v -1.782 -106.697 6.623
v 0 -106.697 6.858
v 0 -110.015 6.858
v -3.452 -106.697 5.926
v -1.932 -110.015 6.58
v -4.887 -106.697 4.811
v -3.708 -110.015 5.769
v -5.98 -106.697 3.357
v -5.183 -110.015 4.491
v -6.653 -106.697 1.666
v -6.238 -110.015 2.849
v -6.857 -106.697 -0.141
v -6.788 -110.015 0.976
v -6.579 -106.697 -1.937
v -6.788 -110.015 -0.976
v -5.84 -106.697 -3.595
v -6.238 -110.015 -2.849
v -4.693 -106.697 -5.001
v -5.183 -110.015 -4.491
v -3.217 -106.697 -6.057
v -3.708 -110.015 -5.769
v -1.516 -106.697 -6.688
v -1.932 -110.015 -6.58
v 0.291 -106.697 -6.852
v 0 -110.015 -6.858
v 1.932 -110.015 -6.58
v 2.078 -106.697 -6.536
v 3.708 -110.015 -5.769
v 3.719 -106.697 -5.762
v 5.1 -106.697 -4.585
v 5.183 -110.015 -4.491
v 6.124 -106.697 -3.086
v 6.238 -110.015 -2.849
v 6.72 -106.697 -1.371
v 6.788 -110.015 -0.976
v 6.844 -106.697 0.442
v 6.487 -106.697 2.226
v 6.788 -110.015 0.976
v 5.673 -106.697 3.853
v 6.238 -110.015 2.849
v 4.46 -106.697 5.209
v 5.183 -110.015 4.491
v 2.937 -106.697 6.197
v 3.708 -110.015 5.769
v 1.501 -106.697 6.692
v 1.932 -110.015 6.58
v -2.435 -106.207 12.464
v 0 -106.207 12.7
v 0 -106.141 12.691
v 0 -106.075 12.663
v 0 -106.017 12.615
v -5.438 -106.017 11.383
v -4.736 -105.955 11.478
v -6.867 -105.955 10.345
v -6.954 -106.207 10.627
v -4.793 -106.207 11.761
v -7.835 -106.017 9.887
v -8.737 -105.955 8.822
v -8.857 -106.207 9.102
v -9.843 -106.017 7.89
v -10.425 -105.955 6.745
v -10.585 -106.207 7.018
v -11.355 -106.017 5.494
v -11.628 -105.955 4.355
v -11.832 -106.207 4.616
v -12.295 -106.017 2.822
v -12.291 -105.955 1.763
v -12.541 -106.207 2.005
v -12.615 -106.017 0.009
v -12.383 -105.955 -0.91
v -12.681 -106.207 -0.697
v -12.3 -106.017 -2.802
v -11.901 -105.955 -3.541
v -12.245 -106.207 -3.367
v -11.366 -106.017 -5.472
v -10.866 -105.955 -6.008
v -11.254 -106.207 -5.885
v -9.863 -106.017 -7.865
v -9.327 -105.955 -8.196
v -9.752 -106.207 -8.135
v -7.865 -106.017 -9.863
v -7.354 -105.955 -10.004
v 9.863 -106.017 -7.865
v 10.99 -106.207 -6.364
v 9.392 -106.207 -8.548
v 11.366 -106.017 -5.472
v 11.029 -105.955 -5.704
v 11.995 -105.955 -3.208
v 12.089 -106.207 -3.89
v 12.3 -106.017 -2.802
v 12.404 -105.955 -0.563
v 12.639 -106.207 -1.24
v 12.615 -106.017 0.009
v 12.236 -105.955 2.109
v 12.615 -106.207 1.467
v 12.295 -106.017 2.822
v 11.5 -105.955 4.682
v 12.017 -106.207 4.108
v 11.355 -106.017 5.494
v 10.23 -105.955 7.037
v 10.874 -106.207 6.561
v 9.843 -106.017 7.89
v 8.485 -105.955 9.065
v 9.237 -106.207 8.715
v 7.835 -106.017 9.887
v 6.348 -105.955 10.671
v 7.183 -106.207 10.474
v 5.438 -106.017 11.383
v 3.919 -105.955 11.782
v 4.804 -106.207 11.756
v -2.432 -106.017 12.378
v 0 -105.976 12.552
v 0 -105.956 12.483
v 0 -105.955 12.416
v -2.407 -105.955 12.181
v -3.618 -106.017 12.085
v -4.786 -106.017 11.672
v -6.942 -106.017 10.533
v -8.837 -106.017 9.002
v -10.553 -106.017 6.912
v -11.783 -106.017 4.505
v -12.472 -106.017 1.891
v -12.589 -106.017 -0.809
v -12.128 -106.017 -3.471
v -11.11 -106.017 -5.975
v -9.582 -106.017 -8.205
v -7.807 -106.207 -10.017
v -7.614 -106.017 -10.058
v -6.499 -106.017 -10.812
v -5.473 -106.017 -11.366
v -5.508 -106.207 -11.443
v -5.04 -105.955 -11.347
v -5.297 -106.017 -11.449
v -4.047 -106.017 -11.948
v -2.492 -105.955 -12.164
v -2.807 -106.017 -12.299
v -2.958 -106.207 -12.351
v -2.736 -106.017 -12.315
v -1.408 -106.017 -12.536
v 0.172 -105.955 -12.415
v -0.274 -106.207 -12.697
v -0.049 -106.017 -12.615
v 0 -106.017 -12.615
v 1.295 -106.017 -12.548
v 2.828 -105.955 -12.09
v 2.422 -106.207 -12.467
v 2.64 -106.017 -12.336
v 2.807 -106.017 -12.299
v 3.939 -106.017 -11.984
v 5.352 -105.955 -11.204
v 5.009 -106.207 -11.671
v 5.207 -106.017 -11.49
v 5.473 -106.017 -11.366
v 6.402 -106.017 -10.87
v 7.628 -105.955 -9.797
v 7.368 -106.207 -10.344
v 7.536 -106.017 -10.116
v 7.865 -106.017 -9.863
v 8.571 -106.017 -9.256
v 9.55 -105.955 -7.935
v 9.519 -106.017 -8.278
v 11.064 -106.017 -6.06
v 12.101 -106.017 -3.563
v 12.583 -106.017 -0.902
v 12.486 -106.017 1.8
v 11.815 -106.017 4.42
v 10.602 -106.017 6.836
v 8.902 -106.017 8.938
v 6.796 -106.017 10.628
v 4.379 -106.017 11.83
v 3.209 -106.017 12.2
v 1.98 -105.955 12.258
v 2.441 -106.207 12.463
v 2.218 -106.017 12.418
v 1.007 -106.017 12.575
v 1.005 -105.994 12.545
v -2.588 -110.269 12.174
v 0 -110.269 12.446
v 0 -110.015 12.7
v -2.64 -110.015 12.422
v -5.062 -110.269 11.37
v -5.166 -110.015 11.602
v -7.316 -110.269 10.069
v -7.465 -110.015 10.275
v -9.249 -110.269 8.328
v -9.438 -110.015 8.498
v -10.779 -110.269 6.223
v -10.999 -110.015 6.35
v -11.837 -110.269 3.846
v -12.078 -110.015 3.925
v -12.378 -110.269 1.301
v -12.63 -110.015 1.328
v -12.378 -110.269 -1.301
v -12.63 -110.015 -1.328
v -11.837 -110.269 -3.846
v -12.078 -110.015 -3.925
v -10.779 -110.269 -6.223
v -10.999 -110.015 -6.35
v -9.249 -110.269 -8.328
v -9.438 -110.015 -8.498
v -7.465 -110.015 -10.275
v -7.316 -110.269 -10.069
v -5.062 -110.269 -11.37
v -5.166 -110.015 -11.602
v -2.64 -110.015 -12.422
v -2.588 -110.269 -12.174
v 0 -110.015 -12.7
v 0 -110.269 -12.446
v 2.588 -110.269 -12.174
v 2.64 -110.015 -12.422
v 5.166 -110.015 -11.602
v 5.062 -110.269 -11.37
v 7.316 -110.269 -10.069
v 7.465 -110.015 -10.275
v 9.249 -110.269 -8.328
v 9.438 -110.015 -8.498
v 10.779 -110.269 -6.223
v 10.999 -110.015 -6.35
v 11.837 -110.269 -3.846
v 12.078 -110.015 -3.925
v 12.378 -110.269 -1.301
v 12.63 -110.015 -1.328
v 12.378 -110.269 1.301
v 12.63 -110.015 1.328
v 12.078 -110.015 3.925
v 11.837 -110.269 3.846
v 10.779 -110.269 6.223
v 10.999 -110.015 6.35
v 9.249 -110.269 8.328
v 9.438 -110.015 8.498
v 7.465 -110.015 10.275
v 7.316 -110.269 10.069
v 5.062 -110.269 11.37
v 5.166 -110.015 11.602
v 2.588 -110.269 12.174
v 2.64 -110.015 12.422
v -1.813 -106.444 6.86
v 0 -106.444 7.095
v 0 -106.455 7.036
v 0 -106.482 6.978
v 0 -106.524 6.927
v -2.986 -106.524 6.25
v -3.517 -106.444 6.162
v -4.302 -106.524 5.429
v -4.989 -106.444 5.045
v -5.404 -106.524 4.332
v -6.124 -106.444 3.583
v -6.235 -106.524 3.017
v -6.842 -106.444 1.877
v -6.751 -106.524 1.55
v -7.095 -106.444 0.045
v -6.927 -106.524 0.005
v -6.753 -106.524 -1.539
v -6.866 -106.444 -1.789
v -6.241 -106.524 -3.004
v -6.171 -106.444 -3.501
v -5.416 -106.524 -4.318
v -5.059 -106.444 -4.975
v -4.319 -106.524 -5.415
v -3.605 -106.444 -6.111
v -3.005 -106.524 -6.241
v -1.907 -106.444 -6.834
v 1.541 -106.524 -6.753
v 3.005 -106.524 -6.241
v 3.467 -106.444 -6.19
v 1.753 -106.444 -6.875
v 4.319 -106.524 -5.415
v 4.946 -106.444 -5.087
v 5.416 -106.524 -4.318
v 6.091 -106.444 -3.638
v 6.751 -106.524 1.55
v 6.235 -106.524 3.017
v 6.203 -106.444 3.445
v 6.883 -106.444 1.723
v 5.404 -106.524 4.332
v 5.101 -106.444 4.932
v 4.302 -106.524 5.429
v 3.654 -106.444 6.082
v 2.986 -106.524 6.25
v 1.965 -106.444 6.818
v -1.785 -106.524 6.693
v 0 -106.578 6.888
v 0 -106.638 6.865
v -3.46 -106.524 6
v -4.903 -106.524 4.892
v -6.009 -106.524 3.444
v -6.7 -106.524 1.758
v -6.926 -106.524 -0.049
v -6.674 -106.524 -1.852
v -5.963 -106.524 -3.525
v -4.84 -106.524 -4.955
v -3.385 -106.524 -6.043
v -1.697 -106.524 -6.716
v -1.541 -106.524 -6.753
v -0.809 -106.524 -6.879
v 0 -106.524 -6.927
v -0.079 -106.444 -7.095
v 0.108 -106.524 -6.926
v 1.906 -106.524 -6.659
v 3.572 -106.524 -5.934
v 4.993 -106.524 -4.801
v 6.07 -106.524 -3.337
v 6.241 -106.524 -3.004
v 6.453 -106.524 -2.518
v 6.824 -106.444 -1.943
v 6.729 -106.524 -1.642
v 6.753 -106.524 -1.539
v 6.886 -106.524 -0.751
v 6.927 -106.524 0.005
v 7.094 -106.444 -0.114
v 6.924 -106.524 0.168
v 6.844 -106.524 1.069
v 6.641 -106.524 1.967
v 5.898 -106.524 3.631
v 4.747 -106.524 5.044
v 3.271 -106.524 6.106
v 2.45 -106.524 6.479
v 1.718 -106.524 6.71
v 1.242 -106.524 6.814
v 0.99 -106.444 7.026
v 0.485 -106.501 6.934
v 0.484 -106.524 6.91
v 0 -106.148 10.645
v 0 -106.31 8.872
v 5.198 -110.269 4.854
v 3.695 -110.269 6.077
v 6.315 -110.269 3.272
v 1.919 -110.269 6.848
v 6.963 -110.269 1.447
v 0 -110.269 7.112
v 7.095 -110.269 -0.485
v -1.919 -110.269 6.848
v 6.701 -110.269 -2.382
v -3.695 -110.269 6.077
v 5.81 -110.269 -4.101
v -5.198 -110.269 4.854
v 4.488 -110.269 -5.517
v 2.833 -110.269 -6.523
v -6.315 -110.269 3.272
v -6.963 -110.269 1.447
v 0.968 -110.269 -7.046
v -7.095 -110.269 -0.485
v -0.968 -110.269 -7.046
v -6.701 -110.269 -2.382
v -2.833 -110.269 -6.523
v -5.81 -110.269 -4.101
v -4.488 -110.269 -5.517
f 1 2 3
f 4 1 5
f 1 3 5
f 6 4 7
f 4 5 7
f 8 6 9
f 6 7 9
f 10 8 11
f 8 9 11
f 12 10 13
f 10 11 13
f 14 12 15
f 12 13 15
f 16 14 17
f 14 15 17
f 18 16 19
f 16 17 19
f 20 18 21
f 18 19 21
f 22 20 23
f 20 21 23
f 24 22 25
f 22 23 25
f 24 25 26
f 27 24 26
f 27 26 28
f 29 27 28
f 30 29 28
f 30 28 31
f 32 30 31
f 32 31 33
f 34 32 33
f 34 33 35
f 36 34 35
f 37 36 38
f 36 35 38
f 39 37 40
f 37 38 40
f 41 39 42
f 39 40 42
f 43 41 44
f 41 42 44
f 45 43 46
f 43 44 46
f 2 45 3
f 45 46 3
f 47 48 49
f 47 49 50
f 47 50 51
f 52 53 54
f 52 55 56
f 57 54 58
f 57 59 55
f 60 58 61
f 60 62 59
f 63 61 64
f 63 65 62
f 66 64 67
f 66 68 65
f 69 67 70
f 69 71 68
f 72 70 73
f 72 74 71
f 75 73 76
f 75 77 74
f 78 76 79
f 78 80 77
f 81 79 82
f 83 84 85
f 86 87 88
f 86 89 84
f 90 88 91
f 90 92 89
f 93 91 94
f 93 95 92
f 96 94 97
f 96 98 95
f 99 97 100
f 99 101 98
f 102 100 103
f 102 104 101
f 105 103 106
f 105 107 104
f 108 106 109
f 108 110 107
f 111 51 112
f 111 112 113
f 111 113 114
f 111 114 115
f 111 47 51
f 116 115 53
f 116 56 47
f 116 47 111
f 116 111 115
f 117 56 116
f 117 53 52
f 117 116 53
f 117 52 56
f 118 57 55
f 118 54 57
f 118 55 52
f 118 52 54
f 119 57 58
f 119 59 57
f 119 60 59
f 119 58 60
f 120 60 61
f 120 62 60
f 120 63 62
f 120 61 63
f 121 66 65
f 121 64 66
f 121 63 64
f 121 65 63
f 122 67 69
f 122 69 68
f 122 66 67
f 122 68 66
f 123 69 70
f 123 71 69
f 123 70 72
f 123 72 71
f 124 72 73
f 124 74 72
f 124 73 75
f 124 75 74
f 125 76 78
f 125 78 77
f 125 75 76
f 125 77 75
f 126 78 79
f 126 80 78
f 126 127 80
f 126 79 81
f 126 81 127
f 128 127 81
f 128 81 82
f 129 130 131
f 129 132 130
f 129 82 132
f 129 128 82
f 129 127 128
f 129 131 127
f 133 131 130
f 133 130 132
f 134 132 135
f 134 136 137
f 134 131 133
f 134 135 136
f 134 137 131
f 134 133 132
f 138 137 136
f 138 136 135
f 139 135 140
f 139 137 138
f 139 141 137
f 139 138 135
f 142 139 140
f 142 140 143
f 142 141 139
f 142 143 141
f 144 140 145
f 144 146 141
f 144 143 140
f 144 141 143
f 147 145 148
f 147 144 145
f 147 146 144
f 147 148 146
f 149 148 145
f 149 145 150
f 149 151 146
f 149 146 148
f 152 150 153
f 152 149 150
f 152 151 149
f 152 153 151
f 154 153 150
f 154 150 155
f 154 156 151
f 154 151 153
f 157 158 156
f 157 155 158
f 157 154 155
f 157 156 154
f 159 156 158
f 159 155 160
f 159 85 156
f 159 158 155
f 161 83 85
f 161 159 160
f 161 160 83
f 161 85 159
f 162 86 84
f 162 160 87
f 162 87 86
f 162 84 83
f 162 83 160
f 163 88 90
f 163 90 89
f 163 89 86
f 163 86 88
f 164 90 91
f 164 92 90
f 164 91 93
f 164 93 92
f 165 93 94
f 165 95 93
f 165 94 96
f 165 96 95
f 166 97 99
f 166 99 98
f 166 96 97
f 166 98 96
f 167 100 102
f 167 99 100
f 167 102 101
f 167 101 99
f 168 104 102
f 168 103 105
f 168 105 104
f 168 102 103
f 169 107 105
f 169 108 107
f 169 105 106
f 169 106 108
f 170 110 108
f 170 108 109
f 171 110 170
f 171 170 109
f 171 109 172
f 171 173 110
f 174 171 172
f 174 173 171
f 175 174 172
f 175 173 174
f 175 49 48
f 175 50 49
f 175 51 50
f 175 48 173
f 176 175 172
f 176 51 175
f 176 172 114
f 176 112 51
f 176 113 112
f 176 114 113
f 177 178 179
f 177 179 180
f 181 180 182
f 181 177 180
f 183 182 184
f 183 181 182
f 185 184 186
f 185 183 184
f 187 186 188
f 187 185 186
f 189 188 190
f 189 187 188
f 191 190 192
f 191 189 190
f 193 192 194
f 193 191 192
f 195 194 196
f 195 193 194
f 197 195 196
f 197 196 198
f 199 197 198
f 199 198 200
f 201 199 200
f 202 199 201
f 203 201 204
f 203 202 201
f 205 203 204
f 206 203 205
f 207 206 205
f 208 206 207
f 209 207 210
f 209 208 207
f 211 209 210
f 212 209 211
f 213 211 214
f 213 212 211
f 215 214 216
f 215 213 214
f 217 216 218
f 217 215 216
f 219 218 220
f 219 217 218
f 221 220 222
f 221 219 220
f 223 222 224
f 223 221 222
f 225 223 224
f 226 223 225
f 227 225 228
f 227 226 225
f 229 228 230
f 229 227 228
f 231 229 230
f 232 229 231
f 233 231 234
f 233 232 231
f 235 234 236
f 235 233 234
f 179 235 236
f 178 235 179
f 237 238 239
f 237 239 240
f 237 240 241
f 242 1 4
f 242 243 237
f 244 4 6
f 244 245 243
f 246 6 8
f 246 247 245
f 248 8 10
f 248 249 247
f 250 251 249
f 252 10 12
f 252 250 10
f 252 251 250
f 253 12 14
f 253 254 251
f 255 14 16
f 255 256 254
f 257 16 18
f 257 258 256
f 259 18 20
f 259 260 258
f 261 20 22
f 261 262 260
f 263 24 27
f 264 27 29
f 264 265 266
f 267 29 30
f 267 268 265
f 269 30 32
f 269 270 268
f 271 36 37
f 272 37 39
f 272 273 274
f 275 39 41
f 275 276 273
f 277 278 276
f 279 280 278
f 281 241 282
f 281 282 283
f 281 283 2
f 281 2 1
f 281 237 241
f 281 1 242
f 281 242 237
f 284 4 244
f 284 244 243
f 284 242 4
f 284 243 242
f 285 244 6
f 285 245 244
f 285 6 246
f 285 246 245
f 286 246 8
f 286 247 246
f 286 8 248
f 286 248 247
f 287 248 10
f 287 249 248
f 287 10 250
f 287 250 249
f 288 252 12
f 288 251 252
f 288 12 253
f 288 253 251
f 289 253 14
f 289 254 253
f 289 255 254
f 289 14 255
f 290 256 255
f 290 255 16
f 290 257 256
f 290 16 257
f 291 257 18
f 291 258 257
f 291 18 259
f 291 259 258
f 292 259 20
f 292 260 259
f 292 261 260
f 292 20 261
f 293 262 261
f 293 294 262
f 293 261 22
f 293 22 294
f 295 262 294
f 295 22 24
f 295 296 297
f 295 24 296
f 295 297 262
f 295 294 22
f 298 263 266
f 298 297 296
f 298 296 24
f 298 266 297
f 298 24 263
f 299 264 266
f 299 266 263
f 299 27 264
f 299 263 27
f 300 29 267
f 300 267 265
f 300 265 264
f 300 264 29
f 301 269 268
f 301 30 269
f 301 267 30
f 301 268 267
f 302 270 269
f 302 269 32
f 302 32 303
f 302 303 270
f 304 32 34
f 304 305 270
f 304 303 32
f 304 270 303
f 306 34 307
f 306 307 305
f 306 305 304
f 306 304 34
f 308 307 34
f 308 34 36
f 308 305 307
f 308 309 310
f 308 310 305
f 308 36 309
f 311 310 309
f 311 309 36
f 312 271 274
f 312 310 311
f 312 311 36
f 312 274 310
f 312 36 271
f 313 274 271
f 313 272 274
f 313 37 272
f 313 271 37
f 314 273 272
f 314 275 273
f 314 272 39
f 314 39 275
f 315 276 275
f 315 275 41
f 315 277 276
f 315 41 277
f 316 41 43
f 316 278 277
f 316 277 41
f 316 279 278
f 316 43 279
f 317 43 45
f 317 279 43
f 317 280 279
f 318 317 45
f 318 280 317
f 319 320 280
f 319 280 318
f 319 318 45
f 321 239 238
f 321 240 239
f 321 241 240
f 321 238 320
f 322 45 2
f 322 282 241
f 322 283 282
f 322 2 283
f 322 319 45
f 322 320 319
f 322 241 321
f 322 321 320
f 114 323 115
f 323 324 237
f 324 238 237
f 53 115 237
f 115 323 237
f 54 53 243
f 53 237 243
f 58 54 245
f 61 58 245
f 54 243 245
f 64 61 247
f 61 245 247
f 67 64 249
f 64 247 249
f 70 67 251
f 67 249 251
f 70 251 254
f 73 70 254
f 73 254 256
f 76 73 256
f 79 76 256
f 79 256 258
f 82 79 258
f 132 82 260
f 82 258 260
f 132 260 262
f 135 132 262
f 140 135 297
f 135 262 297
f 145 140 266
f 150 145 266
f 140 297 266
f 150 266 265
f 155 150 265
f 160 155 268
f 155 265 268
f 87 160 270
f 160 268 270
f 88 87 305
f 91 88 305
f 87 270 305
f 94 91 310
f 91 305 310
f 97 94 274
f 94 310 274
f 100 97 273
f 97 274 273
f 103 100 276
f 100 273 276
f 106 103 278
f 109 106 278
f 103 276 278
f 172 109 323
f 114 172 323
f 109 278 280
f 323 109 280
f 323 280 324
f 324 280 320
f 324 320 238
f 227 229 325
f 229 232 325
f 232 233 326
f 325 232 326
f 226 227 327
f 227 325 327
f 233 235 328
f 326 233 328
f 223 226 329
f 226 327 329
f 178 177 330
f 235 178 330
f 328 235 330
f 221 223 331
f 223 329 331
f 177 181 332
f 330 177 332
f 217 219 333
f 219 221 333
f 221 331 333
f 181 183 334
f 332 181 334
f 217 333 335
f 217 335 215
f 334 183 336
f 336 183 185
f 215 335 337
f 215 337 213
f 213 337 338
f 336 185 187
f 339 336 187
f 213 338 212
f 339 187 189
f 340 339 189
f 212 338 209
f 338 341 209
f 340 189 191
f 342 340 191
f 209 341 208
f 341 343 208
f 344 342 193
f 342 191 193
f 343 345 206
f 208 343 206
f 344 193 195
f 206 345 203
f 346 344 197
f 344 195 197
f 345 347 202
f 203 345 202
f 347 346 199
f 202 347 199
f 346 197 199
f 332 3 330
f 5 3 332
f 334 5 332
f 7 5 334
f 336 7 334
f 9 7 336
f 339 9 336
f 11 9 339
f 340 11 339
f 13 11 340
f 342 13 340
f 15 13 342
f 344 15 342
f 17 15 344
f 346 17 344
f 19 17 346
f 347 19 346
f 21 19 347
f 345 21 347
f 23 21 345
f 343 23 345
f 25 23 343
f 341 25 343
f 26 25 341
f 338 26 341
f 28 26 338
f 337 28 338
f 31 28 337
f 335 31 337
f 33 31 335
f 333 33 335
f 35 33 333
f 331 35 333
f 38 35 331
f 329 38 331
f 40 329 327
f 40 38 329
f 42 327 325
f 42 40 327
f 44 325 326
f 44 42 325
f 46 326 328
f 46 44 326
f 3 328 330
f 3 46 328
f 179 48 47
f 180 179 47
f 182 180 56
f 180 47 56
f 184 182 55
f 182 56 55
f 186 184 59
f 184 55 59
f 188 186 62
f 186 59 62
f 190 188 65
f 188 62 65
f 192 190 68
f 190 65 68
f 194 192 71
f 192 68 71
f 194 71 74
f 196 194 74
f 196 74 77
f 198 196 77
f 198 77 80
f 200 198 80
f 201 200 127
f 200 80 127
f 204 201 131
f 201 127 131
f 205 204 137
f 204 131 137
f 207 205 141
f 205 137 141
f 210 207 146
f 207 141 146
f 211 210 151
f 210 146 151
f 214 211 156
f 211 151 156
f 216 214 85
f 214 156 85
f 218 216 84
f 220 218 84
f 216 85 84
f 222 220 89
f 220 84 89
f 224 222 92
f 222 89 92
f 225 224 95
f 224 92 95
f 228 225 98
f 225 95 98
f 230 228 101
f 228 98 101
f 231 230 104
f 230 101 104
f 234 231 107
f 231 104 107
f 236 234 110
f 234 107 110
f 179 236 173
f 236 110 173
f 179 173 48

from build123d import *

# Parameters (mm, degrees)
FILLET3_R     = 0.254
CHAMFER2_SIZE = 0.254


with BuildPart() as part:
    # Sketch1 → Concave Revolve (revolve)
    with BuildSketch(Plane.XY, mode=Mode.PRIVATE) as concave_revolve_sk:
        with BuildLine():
            Line((6.858, -110.269336068), (12.7, -110.269336068))
            Line((12.7, -110.269336068), (12.7, -105.921350067))
            ThreePointArc((12.7, -105.921350067), (9.782698924, -106.23050975), (6.858, -106.459336068))
            Line((6.858, -106.459336068), (6.858, -110.269336068))
        make_face()
    revolve(concave_revolve_sk.sketch.rotate(Axis((0, 0, 0), (0, -1, 0)), 90), axis=Axis((0, 0, 0), (0, -1, 0)))  # turned: the seam where the file's is

    # Fillet3
    fillet3_edges = [part.edges().sort_by_distance(p)[0] for p in [
        (0, -106.459336068, -6.858),
        (0, -105.921350067, -12.7),
    ]]
    fillet(fillet3_edges, radius=FILLET3_R)

    # Chamfer2
    chamfer2_edges = [part.edges().sort_by_distance(p)[0] for p in [
        (0, -110.269336068, -12.7),
        (0, -110.269336068, -6.858),
    ]]
    chamfer(chamfer2_edges, length=CHAMFER2_SIZE)


solid = part.part
